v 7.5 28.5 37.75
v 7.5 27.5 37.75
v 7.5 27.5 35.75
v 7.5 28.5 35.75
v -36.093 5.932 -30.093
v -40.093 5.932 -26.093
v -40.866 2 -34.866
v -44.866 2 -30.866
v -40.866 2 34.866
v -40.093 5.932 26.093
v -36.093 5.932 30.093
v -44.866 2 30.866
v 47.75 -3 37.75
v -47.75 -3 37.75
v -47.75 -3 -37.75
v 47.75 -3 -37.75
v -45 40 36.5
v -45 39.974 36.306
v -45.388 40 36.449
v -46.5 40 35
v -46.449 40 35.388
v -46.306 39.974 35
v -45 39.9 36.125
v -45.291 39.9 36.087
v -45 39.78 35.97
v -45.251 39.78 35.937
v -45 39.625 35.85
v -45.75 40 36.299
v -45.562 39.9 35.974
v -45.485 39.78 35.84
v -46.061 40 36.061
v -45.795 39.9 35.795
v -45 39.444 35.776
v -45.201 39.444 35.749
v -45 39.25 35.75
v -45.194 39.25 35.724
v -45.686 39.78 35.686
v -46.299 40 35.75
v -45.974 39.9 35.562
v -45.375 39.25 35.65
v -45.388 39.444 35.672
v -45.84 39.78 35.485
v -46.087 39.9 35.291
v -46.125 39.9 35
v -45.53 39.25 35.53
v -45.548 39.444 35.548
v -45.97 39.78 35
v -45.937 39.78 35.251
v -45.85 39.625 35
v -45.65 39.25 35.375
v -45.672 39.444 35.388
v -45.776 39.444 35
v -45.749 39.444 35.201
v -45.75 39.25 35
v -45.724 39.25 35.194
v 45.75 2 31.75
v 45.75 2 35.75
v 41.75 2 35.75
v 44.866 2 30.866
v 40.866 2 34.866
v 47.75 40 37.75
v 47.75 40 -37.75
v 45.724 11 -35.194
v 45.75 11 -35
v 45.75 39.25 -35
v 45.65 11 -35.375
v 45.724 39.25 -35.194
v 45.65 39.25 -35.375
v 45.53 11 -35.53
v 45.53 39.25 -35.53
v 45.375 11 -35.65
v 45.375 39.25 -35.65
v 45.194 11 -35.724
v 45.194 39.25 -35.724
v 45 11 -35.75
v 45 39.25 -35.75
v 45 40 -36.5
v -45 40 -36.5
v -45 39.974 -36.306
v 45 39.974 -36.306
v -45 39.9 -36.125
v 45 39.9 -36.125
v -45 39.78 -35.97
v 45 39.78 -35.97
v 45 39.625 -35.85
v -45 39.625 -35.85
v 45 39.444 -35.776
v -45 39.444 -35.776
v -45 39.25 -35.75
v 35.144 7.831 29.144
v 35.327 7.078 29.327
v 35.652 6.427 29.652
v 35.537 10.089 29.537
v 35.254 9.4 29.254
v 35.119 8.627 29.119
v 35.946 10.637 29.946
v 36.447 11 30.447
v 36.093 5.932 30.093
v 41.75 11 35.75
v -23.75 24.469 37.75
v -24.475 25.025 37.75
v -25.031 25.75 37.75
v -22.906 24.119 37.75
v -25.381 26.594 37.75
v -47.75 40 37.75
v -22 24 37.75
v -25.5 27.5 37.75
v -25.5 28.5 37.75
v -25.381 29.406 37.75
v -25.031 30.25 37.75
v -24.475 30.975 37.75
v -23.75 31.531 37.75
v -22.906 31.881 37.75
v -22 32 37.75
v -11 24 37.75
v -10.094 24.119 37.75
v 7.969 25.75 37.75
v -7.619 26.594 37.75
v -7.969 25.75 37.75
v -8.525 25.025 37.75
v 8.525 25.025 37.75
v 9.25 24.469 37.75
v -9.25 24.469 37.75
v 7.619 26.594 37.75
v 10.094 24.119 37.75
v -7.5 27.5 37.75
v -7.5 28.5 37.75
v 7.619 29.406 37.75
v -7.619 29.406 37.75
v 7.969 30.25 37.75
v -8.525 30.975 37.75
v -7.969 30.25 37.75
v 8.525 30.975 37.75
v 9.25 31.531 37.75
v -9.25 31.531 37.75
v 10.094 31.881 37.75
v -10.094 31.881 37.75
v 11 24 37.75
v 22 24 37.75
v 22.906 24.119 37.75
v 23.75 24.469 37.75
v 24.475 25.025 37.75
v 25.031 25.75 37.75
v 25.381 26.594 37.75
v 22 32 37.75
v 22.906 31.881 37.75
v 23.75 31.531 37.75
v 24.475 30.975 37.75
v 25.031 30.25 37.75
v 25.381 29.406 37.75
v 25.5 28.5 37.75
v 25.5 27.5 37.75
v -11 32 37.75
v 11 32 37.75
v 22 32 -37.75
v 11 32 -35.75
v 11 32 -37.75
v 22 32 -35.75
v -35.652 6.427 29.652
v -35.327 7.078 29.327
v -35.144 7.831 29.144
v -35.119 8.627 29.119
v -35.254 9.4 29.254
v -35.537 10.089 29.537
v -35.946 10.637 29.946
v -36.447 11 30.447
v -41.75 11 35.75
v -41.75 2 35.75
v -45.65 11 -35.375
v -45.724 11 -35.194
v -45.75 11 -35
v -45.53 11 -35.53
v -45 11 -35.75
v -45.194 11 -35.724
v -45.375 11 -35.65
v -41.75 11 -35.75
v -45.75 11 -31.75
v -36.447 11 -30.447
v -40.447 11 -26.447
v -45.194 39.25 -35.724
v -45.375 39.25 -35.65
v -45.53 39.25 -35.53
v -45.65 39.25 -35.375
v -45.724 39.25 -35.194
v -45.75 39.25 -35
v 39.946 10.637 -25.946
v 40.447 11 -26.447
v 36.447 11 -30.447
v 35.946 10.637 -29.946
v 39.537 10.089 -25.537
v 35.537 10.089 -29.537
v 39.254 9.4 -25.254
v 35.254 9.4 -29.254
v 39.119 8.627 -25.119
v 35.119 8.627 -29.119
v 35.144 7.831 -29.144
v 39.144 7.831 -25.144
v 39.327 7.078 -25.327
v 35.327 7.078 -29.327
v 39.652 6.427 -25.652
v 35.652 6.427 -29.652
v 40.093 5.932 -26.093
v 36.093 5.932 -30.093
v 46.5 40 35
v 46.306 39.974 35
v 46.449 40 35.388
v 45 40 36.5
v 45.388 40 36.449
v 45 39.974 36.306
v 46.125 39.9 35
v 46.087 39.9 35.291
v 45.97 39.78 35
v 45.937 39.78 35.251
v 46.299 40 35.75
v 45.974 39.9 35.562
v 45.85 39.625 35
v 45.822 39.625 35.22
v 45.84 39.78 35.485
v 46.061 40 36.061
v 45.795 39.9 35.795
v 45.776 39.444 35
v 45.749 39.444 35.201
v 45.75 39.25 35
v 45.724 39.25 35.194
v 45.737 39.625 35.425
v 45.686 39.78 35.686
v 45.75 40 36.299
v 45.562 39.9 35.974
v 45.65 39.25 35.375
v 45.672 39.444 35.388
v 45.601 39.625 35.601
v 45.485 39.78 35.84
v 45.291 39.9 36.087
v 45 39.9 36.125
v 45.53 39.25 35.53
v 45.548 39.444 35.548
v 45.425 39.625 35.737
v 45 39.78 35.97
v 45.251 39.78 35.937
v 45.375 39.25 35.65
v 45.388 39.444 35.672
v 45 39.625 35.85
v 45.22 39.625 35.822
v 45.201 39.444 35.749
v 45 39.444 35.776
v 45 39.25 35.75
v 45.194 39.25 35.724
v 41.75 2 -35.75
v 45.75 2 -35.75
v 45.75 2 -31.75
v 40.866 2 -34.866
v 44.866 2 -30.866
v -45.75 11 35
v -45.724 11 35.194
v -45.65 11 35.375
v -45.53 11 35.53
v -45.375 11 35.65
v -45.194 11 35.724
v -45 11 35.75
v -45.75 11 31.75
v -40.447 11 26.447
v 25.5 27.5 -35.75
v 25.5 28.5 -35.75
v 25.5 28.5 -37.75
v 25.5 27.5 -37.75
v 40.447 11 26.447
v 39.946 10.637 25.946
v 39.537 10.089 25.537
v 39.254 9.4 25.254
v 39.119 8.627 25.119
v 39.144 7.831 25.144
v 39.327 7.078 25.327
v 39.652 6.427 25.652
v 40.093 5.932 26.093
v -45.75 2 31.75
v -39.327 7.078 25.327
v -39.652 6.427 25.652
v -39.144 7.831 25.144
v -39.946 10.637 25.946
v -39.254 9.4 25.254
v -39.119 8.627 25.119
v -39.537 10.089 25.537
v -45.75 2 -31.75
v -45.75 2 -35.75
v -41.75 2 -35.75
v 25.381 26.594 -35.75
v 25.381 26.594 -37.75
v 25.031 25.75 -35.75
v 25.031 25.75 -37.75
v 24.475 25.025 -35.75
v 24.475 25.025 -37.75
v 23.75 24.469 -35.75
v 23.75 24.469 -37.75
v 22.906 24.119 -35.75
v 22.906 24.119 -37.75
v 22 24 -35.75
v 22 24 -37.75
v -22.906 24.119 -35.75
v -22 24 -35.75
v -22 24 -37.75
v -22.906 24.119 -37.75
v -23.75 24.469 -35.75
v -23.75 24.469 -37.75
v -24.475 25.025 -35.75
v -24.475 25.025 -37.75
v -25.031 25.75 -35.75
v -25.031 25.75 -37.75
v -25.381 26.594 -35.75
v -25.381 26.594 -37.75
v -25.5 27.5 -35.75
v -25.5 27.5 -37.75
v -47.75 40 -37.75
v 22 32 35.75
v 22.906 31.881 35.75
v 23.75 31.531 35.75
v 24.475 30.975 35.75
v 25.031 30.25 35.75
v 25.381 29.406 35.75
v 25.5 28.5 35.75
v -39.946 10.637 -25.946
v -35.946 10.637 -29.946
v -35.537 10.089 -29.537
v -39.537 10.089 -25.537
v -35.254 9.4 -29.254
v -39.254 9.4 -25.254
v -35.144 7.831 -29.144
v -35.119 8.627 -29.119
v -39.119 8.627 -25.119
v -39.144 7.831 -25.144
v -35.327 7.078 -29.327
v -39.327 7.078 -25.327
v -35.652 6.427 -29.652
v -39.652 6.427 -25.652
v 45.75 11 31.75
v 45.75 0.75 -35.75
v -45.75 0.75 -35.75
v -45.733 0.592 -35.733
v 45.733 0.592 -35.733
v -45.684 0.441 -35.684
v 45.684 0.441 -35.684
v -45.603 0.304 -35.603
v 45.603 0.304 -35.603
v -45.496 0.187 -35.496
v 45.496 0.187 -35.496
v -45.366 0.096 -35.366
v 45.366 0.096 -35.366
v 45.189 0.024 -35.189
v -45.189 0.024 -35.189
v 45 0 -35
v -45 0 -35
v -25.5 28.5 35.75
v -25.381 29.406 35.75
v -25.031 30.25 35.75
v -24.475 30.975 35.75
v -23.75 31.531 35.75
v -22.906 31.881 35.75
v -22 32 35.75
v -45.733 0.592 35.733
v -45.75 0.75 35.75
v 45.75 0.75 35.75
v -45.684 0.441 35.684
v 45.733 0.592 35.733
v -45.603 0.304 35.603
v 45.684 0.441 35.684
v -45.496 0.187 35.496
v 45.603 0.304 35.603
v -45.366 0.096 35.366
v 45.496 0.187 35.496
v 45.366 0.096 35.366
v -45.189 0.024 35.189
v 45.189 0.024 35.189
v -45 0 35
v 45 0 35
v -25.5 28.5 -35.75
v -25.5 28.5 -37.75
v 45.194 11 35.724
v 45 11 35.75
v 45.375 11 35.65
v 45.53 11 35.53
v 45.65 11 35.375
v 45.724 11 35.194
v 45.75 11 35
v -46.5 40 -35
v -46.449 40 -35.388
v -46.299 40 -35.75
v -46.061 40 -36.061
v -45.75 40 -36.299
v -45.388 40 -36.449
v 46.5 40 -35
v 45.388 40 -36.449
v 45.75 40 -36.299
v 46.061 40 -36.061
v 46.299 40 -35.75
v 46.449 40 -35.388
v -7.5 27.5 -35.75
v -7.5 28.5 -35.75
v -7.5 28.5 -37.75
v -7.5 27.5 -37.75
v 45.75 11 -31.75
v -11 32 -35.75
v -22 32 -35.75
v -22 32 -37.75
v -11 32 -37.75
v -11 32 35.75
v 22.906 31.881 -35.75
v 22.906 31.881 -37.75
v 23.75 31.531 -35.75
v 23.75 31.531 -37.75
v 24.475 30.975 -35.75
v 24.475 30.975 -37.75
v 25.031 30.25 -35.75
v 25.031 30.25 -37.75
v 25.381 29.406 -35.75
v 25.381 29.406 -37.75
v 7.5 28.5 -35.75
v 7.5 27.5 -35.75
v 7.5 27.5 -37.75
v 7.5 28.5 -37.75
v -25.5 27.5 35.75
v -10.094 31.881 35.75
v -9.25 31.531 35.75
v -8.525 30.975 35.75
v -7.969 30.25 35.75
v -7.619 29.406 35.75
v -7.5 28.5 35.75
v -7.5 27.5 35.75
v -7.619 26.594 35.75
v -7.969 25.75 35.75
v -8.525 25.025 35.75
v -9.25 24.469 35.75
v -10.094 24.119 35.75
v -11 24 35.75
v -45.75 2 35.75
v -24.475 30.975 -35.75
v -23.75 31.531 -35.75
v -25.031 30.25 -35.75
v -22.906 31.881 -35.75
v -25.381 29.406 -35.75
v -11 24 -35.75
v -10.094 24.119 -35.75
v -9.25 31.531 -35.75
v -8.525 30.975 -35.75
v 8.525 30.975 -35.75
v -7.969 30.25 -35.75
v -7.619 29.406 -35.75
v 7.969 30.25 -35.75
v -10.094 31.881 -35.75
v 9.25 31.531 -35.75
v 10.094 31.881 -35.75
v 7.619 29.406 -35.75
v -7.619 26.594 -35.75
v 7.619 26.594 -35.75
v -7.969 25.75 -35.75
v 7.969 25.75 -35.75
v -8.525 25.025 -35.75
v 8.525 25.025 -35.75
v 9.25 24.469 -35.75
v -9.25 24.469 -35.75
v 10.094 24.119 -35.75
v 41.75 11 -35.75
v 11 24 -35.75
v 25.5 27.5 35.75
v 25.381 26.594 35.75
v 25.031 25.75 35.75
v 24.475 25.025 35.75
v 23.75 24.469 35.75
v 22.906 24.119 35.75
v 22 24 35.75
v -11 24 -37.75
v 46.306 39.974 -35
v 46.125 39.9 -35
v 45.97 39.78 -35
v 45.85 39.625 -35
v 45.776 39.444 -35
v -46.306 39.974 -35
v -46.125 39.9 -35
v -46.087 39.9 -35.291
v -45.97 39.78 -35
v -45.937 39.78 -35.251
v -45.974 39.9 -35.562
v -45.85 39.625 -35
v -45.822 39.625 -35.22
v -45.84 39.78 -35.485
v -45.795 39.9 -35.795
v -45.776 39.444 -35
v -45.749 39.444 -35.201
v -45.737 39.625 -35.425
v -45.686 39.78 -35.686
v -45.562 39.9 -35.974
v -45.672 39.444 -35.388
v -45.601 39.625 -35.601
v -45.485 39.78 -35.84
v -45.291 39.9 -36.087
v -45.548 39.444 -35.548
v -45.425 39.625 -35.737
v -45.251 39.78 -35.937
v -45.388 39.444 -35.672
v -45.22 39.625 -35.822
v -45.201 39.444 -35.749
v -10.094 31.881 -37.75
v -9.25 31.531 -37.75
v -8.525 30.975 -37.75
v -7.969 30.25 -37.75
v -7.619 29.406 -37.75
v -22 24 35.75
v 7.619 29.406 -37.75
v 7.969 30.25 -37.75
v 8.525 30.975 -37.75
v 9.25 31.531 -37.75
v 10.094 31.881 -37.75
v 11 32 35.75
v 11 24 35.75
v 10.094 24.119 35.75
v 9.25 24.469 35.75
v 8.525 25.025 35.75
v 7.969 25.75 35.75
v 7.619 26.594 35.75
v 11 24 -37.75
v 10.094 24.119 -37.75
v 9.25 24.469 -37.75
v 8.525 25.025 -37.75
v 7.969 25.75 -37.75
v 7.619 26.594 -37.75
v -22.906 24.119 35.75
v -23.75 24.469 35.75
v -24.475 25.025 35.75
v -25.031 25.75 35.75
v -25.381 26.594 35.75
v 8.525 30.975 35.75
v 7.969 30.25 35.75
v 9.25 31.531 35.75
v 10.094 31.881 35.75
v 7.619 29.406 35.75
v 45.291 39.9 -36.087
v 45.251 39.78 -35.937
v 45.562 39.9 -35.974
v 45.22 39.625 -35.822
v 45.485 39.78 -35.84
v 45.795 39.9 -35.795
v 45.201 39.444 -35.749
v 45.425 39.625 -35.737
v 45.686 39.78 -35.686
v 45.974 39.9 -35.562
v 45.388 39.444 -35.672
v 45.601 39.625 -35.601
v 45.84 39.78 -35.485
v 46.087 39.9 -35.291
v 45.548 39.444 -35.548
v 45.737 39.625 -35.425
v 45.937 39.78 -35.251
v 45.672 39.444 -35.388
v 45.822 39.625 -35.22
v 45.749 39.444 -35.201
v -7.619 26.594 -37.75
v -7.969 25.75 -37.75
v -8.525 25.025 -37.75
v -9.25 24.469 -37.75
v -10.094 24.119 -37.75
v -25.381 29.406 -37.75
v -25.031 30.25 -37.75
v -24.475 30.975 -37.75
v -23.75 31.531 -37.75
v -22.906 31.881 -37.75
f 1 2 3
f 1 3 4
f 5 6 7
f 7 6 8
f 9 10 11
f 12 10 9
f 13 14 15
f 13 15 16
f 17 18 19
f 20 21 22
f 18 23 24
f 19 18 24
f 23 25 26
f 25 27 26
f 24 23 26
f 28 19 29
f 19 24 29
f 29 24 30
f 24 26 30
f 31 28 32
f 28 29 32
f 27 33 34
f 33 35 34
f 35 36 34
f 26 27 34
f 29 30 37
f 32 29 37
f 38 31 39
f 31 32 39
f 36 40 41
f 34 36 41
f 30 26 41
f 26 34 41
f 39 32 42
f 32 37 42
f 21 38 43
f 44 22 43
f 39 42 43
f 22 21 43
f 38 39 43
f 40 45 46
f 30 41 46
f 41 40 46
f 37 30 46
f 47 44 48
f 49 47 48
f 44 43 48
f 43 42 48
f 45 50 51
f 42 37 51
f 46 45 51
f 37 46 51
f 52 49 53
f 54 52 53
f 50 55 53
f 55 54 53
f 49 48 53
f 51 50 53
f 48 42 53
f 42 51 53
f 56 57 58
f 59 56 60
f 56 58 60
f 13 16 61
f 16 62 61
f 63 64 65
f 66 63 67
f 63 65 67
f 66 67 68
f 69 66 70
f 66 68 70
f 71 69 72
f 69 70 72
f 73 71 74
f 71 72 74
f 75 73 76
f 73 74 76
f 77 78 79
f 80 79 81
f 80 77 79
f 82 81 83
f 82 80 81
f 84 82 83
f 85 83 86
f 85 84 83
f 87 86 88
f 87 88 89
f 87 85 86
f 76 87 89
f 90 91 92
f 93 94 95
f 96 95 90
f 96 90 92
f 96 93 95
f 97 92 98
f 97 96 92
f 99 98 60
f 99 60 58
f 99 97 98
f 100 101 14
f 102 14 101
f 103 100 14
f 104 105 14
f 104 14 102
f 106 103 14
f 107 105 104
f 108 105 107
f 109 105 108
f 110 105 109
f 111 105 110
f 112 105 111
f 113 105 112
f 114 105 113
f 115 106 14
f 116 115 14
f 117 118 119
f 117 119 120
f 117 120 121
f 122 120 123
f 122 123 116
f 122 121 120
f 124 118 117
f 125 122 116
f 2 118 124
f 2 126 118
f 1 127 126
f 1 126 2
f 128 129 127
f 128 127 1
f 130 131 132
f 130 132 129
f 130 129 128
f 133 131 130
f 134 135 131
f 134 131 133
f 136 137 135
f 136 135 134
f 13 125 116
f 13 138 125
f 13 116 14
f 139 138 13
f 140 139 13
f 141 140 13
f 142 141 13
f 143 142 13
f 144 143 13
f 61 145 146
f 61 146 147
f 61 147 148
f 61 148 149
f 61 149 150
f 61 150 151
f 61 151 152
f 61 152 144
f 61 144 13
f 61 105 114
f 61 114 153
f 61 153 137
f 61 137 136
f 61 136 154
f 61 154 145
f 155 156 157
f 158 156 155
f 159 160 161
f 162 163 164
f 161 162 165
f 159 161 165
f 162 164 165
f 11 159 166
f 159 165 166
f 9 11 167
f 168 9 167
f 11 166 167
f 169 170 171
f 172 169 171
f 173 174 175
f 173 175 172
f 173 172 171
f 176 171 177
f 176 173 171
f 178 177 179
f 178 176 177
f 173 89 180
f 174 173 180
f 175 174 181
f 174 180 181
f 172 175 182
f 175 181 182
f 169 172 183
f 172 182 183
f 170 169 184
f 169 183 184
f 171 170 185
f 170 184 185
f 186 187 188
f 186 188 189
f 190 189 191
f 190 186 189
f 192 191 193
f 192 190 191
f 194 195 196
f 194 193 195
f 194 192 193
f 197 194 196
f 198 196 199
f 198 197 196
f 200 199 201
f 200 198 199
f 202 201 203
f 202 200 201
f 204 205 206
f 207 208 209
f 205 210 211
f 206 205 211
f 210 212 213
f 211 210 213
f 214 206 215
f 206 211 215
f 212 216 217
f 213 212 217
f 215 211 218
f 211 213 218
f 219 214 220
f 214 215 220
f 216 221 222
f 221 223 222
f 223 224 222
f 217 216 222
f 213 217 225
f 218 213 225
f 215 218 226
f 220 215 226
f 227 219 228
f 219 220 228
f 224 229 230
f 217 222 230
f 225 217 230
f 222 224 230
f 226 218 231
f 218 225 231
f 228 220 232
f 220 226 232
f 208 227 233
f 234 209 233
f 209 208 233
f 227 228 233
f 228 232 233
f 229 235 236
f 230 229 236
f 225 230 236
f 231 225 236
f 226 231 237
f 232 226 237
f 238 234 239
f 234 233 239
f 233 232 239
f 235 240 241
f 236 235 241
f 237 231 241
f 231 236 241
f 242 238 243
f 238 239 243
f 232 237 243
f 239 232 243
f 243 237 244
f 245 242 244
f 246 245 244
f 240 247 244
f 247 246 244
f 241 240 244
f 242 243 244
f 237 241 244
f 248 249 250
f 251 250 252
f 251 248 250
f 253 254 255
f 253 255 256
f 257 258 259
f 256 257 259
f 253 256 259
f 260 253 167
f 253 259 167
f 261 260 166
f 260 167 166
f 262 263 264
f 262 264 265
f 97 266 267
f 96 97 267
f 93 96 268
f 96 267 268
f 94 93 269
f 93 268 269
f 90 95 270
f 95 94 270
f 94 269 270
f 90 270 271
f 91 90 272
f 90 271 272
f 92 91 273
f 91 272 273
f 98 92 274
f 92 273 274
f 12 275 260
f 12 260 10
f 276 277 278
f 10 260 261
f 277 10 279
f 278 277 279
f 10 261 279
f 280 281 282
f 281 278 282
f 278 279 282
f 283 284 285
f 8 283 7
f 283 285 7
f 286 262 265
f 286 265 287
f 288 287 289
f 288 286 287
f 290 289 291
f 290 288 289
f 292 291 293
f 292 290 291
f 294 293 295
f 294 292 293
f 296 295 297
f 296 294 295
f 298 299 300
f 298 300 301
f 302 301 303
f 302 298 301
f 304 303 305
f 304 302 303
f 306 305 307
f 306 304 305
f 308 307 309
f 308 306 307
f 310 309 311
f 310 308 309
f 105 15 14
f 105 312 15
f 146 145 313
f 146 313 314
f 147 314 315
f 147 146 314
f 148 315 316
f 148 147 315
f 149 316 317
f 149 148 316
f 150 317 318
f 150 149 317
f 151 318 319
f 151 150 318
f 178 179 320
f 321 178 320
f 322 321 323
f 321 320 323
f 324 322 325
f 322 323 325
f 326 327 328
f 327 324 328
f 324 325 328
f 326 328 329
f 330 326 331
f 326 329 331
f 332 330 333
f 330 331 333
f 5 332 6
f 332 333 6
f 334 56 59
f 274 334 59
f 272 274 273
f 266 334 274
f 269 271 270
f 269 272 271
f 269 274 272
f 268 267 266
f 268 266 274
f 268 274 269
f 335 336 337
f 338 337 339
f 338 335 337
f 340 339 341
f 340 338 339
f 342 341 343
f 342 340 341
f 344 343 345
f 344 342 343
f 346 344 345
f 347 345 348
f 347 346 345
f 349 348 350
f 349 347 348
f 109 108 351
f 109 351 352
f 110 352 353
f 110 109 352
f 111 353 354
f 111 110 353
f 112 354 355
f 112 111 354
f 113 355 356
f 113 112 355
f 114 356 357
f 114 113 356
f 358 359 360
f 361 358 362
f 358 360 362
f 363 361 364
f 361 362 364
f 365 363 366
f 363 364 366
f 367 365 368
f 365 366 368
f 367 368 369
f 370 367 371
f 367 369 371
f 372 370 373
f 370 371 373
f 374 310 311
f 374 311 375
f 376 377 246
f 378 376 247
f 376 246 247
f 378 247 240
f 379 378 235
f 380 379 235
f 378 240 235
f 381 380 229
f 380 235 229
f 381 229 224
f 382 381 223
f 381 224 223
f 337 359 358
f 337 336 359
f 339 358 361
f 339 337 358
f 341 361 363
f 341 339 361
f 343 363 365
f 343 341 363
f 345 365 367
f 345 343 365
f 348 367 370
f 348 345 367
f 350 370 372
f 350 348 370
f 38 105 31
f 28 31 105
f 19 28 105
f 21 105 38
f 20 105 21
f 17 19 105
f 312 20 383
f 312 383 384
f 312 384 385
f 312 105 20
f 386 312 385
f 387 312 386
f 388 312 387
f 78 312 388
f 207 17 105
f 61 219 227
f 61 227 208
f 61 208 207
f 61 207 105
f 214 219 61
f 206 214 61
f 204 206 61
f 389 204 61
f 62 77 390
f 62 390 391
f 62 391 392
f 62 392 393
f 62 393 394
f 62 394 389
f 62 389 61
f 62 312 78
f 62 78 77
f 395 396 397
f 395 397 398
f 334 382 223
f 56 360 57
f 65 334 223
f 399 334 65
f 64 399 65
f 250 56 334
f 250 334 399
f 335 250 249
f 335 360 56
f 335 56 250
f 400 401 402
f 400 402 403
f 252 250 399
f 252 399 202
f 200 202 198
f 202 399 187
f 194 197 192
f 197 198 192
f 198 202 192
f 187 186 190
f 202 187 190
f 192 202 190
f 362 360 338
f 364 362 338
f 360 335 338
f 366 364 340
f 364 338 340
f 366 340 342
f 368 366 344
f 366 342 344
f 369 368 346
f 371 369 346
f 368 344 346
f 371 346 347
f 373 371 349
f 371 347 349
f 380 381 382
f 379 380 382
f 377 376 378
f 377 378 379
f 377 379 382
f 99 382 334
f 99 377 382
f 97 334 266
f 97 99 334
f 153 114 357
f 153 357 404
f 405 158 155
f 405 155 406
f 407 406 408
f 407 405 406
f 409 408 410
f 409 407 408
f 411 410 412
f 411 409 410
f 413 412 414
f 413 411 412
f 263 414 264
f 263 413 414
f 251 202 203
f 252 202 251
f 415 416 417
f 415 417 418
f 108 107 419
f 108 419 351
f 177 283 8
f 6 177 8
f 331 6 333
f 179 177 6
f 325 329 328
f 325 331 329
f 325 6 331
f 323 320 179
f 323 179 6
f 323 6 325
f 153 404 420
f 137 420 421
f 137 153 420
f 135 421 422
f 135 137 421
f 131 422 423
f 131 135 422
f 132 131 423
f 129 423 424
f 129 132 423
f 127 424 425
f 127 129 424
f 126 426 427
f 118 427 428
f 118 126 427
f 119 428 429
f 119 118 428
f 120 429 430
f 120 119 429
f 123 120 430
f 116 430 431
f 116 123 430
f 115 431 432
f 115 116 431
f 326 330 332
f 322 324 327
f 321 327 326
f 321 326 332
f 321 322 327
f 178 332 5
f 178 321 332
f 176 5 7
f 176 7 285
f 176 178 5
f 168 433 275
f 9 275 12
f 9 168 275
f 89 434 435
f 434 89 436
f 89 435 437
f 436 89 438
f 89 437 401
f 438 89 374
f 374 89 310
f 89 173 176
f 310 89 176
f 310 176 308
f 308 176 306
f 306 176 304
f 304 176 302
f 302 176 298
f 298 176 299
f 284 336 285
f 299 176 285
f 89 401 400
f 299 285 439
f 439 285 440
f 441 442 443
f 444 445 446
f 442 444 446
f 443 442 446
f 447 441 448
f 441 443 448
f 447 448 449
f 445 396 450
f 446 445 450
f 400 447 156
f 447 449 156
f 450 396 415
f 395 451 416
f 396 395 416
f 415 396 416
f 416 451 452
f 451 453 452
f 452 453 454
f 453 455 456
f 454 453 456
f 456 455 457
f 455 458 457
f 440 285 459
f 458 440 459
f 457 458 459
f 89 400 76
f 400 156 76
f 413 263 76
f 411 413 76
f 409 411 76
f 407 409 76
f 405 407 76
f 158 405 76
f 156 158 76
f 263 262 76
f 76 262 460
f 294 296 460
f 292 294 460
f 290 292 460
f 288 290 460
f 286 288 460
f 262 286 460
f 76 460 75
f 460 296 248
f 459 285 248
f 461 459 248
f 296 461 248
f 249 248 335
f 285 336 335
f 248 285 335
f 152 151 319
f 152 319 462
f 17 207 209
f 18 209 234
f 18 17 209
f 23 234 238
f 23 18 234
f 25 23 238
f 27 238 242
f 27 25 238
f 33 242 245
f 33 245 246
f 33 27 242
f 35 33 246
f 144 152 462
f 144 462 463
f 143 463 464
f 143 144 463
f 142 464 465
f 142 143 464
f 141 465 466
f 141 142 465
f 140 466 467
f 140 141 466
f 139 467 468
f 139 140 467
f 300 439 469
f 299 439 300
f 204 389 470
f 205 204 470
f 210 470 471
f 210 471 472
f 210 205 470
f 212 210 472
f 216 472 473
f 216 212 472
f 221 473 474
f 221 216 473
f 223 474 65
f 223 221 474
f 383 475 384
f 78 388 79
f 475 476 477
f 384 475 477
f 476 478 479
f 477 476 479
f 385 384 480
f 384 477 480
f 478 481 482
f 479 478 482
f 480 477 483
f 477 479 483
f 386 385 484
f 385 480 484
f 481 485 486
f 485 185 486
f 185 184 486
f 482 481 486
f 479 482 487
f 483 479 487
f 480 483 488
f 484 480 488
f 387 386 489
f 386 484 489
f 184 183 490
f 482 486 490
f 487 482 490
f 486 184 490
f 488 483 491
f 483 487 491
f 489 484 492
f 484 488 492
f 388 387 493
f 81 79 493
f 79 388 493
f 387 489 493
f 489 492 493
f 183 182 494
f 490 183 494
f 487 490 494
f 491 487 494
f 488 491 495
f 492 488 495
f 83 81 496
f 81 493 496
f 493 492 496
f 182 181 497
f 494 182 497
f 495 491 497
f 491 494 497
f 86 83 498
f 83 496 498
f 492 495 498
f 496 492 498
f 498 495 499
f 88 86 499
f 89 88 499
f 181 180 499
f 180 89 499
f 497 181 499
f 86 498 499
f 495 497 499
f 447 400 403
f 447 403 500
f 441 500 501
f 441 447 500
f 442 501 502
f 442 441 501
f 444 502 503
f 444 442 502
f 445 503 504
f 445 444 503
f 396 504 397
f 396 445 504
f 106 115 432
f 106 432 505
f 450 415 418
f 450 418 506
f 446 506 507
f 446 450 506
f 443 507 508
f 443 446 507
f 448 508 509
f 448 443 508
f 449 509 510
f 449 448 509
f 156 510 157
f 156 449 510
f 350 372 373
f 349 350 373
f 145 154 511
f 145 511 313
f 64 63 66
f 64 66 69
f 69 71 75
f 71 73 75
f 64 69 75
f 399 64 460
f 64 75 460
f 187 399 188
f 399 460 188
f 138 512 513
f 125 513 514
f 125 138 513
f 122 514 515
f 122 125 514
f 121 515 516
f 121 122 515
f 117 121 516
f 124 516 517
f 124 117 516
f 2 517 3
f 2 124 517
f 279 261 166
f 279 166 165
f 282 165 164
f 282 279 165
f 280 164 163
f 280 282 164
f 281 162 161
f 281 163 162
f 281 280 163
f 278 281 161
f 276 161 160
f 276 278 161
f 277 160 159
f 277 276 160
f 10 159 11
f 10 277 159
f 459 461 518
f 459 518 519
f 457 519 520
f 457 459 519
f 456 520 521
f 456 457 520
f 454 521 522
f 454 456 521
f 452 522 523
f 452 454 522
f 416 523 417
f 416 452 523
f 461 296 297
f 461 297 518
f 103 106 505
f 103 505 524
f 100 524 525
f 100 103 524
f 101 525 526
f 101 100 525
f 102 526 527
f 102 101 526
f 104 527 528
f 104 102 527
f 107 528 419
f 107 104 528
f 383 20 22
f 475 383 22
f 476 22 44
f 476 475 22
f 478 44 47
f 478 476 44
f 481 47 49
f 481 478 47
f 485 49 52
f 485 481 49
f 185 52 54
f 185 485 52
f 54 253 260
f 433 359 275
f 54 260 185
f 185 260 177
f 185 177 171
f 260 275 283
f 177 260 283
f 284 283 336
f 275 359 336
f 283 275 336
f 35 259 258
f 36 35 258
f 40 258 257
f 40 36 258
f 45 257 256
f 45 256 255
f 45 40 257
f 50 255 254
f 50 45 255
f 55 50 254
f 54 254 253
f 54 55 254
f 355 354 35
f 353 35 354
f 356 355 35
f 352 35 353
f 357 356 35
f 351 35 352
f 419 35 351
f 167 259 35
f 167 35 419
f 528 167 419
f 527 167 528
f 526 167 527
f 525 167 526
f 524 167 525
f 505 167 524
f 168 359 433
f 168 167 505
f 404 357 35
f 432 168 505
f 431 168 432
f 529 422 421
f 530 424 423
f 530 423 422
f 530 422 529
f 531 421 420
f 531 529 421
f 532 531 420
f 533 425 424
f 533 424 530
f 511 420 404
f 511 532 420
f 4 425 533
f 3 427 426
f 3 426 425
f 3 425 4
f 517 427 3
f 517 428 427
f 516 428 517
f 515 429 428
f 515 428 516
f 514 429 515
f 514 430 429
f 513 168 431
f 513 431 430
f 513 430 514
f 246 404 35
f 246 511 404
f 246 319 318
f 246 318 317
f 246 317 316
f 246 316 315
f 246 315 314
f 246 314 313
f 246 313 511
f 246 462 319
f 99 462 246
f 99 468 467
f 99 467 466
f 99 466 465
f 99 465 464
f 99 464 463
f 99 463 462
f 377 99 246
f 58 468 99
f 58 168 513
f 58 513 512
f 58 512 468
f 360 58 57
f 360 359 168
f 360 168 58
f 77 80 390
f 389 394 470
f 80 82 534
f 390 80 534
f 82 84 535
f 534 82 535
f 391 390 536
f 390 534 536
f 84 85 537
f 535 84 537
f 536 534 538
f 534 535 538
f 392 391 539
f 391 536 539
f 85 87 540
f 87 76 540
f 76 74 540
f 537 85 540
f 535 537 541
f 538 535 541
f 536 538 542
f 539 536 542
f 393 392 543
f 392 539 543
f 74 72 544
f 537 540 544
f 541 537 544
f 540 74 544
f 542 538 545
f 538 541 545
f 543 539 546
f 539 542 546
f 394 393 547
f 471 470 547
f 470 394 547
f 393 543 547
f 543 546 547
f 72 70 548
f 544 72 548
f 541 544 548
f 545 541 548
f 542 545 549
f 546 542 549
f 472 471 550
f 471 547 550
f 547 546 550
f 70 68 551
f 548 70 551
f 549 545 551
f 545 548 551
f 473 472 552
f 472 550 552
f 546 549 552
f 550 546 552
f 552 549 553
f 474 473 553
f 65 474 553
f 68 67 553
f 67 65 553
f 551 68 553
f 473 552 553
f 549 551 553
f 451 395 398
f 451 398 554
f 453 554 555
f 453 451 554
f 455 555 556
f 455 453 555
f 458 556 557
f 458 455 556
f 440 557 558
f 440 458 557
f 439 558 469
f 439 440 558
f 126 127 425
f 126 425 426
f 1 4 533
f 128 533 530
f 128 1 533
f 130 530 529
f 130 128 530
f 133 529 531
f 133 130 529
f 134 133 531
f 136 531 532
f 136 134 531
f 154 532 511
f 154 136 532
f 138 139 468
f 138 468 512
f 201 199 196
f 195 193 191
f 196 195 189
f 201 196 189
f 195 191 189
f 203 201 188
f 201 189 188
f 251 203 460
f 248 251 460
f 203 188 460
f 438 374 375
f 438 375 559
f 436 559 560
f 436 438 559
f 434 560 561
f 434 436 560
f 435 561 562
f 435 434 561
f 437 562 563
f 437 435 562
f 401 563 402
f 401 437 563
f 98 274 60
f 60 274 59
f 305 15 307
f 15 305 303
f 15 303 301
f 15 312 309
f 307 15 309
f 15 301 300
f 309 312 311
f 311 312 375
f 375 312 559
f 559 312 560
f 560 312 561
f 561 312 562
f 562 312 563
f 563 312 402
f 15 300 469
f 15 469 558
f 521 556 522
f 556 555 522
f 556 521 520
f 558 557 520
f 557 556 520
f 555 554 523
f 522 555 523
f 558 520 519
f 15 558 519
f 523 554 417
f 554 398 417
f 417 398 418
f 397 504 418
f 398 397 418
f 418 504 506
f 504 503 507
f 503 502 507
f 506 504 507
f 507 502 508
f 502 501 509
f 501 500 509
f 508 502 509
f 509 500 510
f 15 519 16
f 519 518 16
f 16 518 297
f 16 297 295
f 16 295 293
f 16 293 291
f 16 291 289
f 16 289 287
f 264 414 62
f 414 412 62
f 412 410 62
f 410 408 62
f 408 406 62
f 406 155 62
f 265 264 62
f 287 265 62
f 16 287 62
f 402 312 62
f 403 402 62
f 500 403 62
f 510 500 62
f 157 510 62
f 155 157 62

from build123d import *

# Parameters (mm, degrees)
SKETCH1_W            = 95.5
SKETCH1_H            = 75.5
SKETCH1_W_2          = 91.5
SKETCH1_H_2          = 71.5
EXTRUDE_THIN1_DEPTH  = 40
SKETCH2_W            = 95.5
SKETCH2_H            = 75.5
BOSS_EXTRUDE1_DEPTH  = 3
CUT_EXTRUDE1_DEPTH   = 98.879070797
BOSS_EXTRUDE3_START  = 11
BOSS_EXTRUDE3_DEPTH  = 9
CUT_EXTRUDE2_REACH   = 83.241
MIRROR2_START        = 11
MIRROR2_COPY_1_DEPTH = 9
MIRROR2_COPY_2_REACH = 83.241
FILLET3_R            = 0.75
FILLET4_R            = 0.75


with BuildPart() as part:
    # Sketch1 → Extrude-Thin1 (new body)
    with BuildSketch(Plane(origin=(0, 0, 0), x_dir=(1, 0, 0), z_dir=(0, 1, 0))):
        Rectangle(SKETCH1_W, SKETCH1_H)
        Rectangle(SKETCH1_W_2, SKETCH1_H_2, mode=Mode.SUBTRACT)
    extrude(amount=EXTRUDE_THIN1_DEPTH)

    # Sketch2 → Boss-Extrude1 (add)
    with BuildSketch(Plane.XZ):
        Rectangle(SKETCH2_W, SKETCH2_H)
    extrude(amount=BOSS_EXTRUDE1_DEPTH)

    # Sketch4 → Cut-Extrude1 (cut, through all)
    with BuildSketch(Plane.XY.offset(37.75)):
        with BuildLine():
            Line((-22, 32), (-11, 32))
            ThreePointArc((-11, 32), (-8.525126266, 30.974873734), (-7.5, 28.5))
            Line((-7.5, 28.5), (-7.5, 27.5))
            ThreePointArc((-7.5, 27.5), (-8.525126266, 25.025126266), (-11, 24))
            Line((-11, 24), (-22, 24))
            ThreePointArc((-22, 24), (-24.474873734, 25.025126266), (-25.5, 27.5))
            Line((-25.5, 27.5), (-25.5, 28.5))
            ThreePointArc((-25.5, 28.5), (-24.474873734, 30.974873734), (-22, 32))
        make_face()
        with BuildLine():
            Line((11, 32), (22, 32))
            ThreePointArc((22, 32), (24.474873734, 30.974873734), (25.5, 28.5))
            Line((25.5, 28.5), (25.5, 27.5))
            ThreePointArc((25.5, 27.5), (24.474873734, 25.025126266), (22, 24))
            Line((22, 24), (11, 24))
            ThreePointArc((11, 24), (8.525126266, 25.025126266), (7.5, 27.5))
            Line((7.5, 27.5), (7.5, 28.5))
            ThreePointArc((7.5, 28.5), (8.525126266, 30.974873734), (11, 32))
        make_face()
    extrude(amount=-CUT_EXTRUDE1_DEPTH, mode=Mode.SUBTRACT)

    # Sketch7 → Boss-Extrude3 (add)
    with BuildSketch(Plane(origin=(0, 0, 0), x_dir=(1, 0, 0), z_dir=(0, 1, 0)).offset(BOSS_EXTRUDE3_START)):
        Polygon((-45.75, 35.75), (-45.75, 31.75), (-38.678932188, 24.678932188), (-34.678932188, 28.678932188), (-41.75, 35.75), align=None)
    boss_extrude3 = extrude(amount=-BOSS_EXTRUDE3_DEPTH)

    # Sketch8 → Cut-Extrude2 (cut, up to next)
    with BuildSketch(Plane(origin=(-7, 0, 7), x_dir=(0.7071067811865489, 0, 0.7071067811865461), z_dir=(-0.7071067811865461, 0, 0.7071067811865489)), mode=Mode.PRIVATE) as cut_extrude2_sk1:
        with BuildLine():
            ThreePointArc((-47.300775542, 11), (-45.423796616, 8.62675879), (-46.800775542, 5.932458739))
            Line((-46.800775542, 5.932458739), (-53.550775542, 2))
            Line((-53.550775542, 2), (-44.800775542, 2))
            Line((-44.800775542, 2), (-44.800775542, 11))
            Line((-44.800775542, 11), (-47.300775542, 11))
        make_face()
    cut_extrude2_tool1 = extrude(cut_extrude2_sk1.sketch, amount=-CUT_EXTRUDE2_REACH, mode=Mode.PRIVATE) & part.part
    cut_extrude2 = cut_extrude2_tool1.solids().sort_by_distance((-40.481625, 4.582192, -26.481625))[0]
    add(cut_extrude2, mode=Mode.SUBTRACT)

    # Mirror1: Boss-Extrude3, Cut-Extrude2 across plane
    add(boss_extrude3.mirror(Plane.XY))
    add(cut_extrude2.mirror(Plane.XY), mode=Mode.SUBTRACT)

    # Mirror2: Boss-Extrude3, Cut-Extrude2 across plane
    add(boss_extrude3.mirror(Plane(origin=(0, 0, 0), x_dir=(0, 0, 1), z_dir=(1, 0, 0))))
    add(cut_extrude2.mirror(Plane(origin=(0, 0, 0), x_dir=(0, 0, 1), z_dir=(1, 0, 0))), mode=Mode.SUBTRACT)

    # Mirror2 copy 1 sketch → Mirror2 copy 1 (add)
    with BuildSketch(Plane(origin=(0, 0, 0), x_dir=(-1, 0, 0), z_dir=(0, 1, 0)).offset(MIRROR2_START)):
        Polygon((-45.75, 35.75), (-45.75, 31.75), (-38.678932188, 24.678932188), (-34.678932188, 28.678932188), (-41.75, 35.75), align=None)
    extrude(amount=-MIRROR2_COPY_1_DEPTH)

    # Mirror2 copy 2 sketch → Mirror2 copy 2 (cut, up to next)
    with BuildSketch(Plane(origin=(7, 0, -7), x_dir=(-0.7071067811865489, 0, -0.7071067811865461), z_dir=(0.7071067811865461, 0, -0.7071067811865489)), mode=Mode.PRIVATE) as mirror2_copy_2_sk1:
        with BuildLine():
            ThreePointArc((-47.300775542, 11), (-45.423796616, 8.62675879), (-46.800775542, 5.932458739))
            Line((-46.800775542, 5.932458739), (-53.550775542, 2))
            Line((-53.550775542, 2), (-44.800775542, 2))
            Line((-44.800775542, 2), (-44.800775542, 11))
            Line((-44.800775542, 11), (-47.300775542, 11))
        make_face()
    mirror2_copy_2_tool1 = extrude(mirror2_copy_2_sk1.sketch, amount=-MIRROR2_COPY_2_REACH, mode=Mode.PRIVATE) & part.part
    add(mirror2_copy_2_tool1.solids().sort_by_distance((40.481625, 4.582192, 26.481625))[0], mode=Mode.SUBTRACT)

    # Fillet3
    fillet3_edges = [part.edges().sort_by_distance(p)[0] for p in [
        (-45.75, 0, 0),
        (0, 0, 35.75),
        (45.75, 0, 0),
        (0, 0, -35.75),
        (45.75, 25.5, 35.75),
        (45.75, 25.5, -35.75),
        (-45.75, 25.5, -35.75),
        (-45.75, 25.5, 35.75),
    ]]
    fillet(fillet3_edges, radius=FILLET3_R)

    # Fillet4
    fillet4_edges = [part.edges().sort_by_distance(p)[0] for p in [
        (-45.75, 40, 0),
        (0, 40, 35.75),
        (45.75, 40, 0),
        (0, 40, -35.75),
        (45.530330086, 40, 35.530330086),
        (45.530330086, 40, -35.530330086),
        (-45.530330086, 40, -35.530330086),
        (-45.530330086, 40, 35.530330086),
    ]]
    fillet(fillet4_edges, radius=FILLET4_R)


solid = part.part
